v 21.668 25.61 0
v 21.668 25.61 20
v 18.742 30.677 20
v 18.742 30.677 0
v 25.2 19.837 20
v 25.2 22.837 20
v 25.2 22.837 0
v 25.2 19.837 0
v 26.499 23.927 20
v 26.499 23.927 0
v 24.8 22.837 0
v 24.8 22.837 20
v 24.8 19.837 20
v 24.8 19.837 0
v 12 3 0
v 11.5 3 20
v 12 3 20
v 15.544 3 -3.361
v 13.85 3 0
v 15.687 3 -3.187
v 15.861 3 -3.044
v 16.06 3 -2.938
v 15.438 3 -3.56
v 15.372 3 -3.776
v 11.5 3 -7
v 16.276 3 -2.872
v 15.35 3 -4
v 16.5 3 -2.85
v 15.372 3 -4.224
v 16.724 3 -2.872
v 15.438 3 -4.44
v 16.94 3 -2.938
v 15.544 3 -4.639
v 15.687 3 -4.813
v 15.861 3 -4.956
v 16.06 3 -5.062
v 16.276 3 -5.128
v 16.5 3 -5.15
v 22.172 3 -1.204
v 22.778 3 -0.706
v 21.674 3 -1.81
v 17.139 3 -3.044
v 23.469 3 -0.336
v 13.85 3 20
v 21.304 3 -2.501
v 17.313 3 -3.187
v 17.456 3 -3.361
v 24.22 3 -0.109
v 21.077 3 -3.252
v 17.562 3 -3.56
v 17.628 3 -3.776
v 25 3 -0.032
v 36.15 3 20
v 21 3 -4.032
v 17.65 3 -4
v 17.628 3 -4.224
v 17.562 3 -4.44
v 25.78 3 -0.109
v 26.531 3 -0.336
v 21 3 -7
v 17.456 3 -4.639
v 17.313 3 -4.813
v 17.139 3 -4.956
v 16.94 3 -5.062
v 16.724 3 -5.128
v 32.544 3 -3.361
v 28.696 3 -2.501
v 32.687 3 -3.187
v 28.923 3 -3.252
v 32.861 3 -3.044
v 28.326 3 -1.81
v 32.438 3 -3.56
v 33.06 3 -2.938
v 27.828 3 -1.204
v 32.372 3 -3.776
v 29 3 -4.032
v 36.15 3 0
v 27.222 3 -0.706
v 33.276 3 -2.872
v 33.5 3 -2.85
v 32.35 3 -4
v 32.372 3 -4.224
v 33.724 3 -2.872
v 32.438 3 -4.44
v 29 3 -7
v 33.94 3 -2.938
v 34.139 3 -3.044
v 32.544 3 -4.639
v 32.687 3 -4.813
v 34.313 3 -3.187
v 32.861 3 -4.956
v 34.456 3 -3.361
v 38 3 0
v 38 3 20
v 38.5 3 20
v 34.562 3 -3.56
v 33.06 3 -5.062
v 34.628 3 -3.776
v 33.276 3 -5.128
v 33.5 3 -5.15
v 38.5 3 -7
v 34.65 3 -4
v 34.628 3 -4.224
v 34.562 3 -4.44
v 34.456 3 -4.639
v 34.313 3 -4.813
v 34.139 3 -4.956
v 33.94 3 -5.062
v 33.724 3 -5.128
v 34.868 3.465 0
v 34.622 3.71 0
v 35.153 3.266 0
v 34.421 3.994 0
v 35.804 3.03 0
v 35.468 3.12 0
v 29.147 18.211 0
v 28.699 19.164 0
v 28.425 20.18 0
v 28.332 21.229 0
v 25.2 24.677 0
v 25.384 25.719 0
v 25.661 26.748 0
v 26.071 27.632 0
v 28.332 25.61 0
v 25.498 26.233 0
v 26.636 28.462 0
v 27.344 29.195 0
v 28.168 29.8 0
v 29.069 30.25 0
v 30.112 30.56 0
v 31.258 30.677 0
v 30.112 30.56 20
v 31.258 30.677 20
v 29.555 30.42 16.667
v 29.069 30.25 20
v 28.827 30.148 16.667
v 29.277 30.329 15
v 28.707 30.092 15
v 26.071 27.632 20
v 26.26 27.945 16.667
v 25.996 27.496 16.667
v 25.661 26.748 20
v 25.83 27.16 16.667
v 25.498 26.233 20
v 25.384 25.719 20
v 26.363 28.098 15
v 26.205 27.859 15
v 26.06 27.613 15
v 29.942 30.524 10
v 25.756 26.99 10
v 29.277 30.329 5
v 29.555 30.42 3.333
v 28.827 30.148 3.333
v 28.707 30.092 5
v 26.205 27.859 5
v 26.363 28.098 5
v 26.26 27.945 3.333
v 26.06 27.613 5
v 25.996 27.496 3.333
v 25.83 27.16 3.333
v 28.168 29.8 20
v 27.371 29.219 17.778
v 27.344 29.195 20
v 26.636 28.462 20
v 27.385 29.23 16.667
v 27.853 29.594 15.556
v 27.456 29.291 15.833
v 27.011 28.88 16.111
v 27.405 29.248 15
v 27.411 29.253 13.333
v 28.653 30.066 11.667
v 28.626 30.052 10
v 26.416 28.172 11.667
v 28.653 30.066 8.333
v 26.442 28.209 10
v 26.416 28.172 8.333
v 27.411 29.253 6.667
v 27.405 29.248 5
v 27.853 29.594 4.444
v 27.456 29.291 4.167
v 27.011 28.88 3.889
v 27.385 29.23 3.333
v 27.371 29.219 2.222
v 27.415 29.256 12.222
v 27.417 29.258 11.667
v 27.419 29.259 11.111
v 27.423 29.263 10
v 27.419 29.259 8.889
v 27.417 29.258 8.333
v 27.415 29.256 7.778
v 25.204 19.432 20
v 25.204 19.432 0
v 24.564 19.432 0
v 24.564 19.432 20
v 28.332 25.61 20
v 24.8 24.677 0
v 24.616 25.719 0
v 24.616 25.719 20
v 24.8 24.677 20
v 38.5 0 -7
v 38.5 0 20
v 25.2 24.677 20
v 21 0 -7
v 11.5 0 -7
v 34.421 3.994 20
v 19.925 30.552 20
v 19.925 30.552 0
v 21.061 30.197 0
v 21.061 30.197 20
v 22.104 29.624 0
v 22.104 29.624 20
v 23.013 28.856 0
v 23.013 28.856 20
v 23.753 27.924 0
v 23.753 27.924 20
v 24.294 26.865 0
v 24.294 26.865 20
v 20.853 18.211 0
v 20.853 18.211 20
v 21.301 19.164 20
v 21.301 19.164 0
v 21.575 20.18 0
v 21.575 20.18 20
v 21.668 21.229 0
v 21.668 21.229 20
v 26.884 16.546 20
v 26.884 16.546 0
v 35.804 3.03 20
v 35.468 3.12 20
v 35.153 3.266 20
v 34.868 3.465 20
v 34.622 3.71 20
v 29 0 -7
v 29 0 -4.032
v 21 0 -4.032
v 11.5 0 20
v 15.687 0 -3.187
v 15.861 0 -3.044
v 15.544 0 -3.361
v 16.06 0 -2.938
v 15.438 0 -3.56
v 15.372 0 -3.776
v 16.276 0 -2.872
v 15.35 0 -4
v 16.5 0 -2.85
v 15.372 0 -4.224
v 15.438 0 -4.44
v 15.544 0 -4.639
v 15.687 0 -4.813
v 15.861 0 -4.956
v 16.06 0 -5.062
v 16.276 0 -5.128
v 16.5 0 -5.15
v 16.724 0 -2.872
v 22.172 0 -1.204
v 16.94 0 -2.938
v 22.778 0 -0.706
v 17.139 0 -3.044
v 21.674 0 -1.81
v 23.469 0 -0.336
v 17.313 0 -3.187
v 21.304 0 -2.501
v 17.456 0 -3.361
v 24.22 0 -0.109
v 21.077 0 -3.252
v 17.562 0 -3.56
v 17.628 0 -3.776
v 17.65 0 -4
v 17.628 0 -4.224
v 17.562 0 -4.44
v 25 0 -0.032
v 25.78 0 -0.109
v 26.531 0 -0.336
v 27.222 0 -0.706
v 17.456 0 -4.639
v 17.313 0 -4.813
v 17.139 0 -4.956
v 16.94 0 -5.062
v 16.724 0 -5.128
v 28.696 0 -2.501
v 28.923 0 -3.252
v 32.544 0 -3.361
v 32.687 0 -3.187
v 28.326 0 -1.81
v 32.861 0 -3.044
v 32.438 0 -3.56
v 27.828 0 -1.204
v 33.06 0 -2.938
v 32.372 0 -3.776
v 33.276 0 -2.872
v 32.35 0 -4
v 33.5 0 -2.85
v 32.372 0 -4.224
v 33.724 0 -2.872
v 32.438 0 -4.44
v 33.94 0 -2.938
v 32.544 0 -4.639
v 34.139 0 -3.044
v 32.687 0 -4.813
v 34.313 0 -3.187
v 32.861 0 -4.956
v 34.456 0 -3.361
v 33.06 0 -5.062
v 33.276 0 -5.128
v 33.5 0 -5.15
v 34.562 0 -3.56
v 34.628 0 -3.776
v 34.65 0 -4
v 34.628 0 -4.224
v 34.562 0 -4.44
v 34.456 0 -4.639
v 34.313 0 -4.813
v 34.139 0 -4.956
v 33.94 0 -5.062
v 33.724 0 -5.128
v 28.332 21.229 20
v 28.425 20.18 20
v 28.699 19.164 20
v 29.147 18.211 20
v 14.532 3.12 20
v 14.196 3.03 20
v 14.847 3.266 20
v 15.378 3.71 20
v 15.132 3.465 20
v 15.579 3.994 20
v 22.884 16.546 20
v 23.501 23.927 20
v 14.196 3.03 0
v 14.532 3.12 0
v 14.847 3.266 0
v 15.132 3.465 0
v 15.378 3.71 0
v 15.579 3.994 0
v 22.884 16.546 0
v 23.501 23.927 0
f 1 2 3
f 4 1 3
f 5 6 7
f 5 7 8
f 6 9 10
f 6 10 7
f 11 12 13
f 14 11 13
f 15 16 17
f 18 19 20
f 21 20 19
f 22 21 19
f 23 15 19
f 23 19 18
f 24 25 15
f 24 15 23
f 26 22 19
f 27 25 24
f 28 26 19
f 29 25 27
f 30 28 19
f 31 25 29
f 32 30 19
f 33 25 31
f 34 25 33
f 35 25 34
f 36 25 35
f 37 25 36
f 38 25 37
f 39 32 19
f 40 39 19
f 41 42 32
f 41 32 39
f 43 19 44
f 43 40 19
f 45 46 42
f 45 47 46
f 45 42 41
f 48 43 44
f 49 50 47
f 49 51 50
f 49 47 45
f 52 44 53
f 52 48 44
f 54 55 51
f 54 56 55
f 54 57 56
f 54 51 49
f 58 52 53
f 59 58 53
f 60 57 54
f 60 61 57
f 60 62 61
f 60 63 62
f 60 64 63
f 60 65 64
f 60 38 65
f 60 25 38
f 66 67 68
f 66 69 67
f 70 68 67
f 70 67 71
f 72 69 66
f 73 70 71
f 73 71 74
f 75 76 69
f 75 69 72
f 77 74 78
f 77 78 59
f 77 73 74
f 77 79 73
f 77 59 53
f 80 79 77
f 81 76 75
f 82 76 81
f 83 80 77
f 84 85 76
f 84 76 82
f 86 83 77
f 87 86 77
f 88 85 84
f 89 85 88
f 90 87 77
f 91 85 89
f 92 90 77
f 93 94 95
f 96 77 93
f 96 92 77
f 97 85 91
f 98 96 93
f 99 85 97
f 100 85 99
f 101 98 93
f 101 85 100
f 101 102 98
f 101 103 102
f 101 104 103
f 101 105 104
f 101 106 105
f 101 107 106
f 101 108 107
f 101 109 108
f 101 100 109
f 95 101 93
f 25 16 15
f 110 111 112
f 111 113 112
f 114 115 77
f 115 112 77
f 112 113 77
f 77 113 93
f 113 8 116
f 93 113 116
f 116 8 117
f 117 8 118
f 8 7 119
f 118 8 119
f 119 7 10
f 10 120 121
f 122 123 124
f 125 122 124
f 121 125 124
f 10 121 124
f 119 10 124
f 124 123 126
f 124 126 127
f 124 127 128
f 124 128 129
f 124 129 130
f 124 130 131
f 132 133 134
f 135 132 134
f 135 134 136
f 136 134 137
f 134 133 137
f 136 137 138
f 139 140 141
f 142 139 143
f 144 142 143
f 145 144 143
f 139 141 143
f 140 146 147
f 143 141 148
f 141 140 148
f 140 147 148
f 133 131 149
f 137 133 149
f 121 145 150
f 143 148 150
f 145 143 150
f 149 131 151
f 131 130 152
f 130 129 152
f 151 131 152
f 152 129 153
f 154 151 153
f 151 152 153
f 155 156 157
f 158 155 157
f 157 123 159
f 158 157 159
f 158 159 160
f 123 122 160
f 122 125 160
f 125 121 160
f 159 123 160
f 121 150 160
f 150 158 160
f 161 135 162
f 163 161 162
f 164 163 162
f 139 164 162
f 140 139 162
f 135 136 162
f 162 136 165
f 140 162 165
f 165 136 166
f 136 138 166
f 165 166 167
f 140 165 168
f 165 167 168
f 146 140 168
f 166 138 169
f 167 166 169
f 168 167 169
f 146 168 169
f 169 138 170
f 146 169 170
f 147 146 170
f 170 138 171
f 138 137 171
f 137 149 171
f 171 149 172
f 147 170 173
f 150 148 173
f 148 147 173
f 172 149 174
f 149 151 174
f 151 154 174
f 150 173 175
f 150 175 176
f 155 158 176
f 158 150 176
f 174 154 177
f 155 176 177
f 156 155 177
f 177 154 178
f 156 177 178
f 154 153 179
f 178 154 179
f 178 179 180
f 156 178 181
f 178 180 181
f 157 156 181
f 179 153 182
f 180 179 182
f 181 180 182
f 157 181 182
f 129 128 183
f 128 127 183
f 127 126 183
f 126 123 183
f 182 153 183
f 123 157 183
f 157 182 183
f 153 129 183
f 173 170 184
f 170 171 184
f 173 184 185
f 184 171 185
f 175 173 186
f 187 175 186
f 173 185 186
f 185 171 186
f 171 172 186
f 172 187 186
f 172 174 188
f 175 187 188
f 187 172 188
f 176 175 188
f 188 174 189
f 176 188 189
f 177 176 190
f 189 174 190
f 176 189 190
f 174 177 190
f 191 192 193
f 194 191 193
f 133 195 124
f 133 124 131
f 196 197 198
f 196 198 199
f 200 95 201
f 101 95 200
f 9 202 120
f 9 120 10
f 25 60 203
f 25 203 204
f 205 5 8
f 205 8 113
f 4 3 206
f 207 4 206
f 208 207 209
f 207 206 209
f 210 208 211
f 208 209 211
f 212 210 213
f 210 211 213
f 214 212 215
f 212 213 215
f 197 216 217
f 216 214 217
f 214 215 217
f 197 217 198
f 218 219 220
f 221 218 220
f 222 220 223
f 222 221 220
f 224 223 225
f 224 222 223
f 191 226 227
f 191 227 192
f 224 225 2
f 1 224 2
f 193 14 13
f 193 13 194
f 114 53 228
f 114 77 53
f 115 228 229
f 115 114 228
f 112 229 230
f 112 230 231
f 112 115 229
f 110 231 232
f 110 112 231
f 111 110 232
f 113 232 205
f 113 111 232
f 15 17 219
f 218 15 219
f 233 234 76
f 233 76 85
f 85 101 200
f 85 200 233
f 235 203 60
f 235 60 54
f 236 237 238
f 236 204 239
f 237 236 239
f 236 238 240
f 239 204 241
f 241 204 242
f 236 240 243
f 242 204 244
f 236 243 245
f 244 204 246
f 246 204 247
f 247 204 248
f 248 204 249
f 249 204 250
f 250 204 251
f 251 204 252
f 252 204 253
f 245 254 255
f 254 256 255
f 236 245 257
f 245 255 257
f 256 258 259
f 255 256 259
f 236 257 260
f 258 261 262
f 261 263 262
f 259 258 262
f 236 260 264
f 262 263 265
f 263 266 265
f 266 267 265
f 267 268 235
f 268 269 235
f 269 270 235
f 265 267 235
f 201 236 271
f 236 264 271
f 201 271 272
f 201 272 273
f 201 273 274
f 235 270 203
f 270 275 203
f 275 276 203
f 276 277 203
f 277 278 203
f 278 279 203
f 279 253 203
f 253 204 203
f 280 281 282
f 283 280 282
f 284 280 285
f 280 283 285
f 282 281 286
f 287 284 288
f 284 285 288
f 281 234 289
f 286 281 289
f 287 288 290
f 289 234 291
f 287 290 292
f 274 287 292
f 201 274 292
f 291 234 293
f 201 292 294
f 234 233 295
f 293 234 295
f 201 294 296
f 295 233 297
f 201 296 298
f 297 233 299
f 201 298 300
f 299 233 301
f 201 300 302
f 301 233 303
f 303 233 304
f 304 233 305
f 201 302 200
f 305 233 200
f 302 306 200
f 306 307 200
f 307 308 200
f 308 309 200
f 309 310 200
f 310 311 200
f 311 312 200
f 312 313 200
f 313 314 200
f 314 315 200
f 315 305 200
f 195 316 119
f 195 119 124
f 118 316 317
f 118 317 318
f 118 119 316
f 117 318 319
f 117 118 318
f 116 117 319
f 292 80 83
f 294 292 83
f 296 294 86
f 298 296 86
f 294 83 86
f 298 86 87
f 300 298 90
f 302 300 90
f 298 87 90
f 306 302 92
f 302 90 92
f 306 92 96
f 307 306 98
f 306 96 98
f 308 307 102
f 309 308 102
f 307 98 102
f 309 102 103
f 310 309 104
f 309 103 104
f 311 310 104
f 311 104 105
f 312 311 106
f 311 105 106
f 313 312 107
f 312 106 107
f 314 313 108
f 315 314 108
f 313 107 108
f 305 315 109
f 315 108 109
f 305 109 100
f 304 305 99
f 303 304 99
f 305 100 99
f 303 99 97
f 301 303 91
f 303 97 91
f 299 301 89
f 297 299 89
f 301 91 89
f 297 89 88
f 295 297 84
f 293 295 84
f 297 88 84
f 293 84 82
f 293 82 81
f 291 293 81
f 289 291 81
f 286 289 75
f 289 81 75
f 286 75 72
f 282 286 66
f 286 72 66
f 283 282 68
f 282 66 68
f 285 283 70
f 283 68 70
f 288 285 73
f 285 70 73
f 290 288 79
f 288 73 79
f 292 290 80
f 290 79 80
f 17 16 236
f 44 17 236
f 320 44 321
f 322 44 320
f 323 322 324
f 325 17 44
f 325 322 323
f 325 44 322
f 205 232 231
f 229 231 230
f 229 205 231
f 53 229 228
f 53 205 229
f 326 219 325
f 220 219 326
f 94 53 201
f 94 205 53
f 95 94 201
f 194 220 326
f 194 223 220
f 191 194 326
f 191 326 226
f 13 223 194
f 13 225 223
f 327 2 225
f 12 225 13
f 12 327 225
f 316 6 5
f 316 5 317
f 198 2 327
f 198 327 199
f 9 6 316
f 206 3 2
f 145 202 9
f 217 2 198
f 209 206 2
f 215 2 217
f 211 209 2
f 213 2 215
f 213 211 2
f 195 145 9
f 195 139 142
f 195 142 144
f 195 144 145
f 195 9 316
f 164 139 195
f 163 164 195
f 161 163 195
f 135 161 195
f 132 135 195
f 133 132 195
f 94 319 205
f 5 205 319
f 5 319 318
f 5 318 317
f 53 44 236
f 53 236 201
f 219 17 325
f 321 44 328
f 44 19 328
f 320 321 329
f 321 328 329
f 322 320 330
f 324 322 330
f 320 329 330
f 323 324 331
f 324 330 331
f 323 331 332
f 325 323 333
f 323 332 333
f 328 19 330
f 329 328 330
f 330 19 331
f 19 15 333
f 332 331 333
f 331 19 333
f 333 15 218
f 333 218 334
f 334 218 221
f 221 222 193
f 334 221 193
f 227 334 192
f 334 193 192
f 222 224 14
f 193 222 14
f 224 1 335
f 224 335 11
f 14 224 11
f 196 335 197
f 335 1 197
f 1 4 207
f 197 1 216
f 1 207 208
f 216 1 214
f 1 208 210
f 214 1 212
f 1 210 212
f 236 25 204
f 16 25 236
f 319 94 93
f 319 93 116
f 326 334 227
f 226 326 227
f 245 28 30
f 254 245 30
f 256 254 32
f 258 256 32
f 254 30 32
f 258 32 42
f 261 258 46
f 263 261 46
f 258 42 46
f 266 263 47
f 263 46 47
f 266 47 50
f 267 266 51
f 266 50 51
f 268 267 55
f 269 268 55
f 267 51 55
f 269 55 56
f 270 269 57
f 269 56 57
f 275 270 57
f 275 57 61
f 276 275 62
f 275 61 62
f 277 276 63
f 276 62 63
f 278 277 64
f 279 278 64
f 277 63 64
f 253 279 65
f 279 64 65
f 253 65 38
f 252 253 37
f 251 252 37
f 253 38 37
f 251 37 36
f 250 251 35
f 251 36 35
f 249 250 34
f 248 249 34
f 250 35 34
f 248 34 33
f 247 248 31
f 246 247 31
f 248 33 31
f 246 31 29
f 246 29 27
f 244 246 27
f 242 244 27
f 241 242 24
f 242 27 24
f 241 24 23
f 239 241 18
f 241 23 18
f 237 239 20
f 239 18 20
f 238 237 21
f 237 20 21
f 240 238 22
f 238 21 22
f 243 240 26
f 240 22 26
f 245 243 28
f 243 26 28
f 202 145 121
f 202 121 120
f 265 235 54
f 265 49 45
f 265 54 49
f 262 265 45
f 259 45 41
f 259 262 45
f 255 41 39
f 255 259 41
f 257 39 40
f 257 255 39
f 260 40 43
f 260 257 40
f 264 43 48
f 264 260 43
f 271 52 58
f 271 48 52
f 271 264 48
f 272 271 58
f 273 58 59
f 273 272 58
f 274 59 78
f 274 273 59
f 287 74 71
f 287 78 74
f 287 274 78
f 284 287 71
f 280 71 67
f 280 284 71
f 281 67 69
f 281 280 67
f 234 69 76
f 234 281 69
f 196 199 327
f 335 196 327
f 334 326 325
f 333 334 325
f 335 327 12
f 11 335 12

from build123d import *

# Parameters (mm, degrees)
SCHIZZO1_W                     = 50
SCHIZZO1_H                     = 3
ESTRUSIONE_ESTRUSIONE1_DEPTH   = 20
ESTRUSIONE_ESTRUSIONE2_DEPTH   = 20
ESTRUSIONE_ESTRUSIONE2_2_DEPTH = 20
RACCORDO2_R                    = 6
RACCORDO3_DEPTH                = 20
RACCORDO4_R                    = 6
RACCORDO5_R                    = 6
RACCORDO7_R                    = 2
RACCORDO8_R                    = 2
SCHIZZO5_W                     = 11.5
SCHIZZO5_H                     = 20
TAGLIO_ESTRUSIONE2_DEPTH       = 3
ESTRUSIONE_ESTRUSIONE7_DEPTH   = 20
SCHIZZO12_R                    = 1.15
ESTRUSIONE_ESTRUSIONE9_DEPTH   = 3
TAGLIO_ESTRUSIONE4_DEPTH       = 52.461506674
TAGLIO_ESTRUSIONE4_DEPTH_BACK  = 52.461506674


with BuildPart() as part:
    # Schizzo1 → Estrusione-Estrusione1 (new body)
    with BuildSketch(Plane.XY):
        with Locations((25, 1.5)):
            Rectangle(SCHIZZO1_W, SCHIZZO1_H)
    extrude(amount=ESTRUSIONE_ESTRUSIONE1_DEPTH)

    # Schizzo5 → Taglio-Estrusione2 (cut)
    with BuildSketch(Plane(origin=(0, 3, 0), x_dir=(1, 0, 0), z_dir=(0, 1, 0))):
        with Locations((5.75, -10)):
            Rectangle(SCHIZZO5_W, SCHIZZO5_H)
        with Locations((44.25, -10)):
            Rectangle(SCHIZZO5_W, SCHIZZO5_H)
    extrude(amount=-TAGLIO_ESTRUSIONE2_DEPTH, mode=Mode.SUBTRACT)



with BuildPart() as body_2:
    # Schizzo2 → Estrusione-Estrusione2 (new body)
    with BuildSketch(Plane.XY.offset(20)):
        Polygon((12, 3), (21.667680152, 19.610006491), (21.667680152, 25.610006491), (18.742038116, 30.677367142), (23.742038116, 30.677367142), (24.8, 24.677367142), (23.500961894, 23.927367142), (24.8, 22.837344747), (24.8, 19.837344747), (15, 3), align=None)
    extrude(amount=-ESTRUSIONE_ESTRUSIONE2_DEPTH)

    # Raccordo2
    # the kernel refuses this fillet: 6 mm, written as the material it takes off along each edge
    with BuildSketch(Plane(origin=(23.742038116, 30.677367142, 32.586494468), x_dir=(-1, 0, 0), z_dir=(0, 0, -1))) as raccordo2_piece_1:
        with BuildLine():
            CenterArc((RACCORDO2_R * 0.839099631177, -RACCORDO2_R), RACCORDO2_R, 90, 80)
            Line((-RACCORDO2_R * 0.145708121835, -RACCORDO2_R * 0.826351822333), (0, 0))
            Line((0, 0), (RACCORDO2_R * 0.839099631177, 0))
        make_face()
    extrude(amount=45.172988935, mode=Mode.SUBTRACT)

    # Raccordo5
    raccordo5_edges = [body_2.edges().sort_by_distance(p)[0] for p in [
        (21.667680152, 19.610006491, 10),
    ]]
    fillet(raccordo5_edges, radius=RACCORDO5_R)

    # Raccordo8
    raccordo8_edges = [body_2.edges().sort_by_distance(p)[0] for p in [
        (15, 3, 10),
    ]]
    fillet(raccordo8_edges, radius=RACCORDO8_R)

    # Schizzo9 → Estrusione-Estrusione7 (add)
    with BuildSketch(Plane.XY.offset(20)):
        Polygon((24.564100135, 19.432046037), (22.884294771, 16.545978484), (26.884294771, 16.545978484), (25.204489408, 19.432046037), align=None)
    extrude(amount=-ESTRUSIONE_ESTRUSIONE7_DEPTH)


with BuildPart() as body_3:
    # Schizzo2 → Estrusione-Estrusione2 2 (new body)
    with BuildSketch(Plane.XY.offset(20)):
        Polygon((26.499038106, 23.927367142), (25.2, 22.837344747), (25.2, 19.837344747), (35, 3), (38, 3), (28.332319848, 19.610006491), (28.332319848, 25.610006491), (31.257961884, 30.677367142), (26.257961884, 30.677367142), (25.2, 24.677367142), align=None)
    extrude(amount=-ESTRUSIONE_ESTRUSIONE2_2_DEPTH)

    # Raccordo3: read off the stored shape, not the designer's step
    # Raccordo3 outline → Raccordo3 (cut)
    with BuildSketch(Plane.XY):
        with BuildLine():
            add(Edge.make_bspline(
                [(31.257961884, 30.677367142), (26.252870263, 30.648491125), (25.38373076, 25.719356061)],
                knots=[0, 0, 0, 1, 1, 1], degree=2, weights=[1, 0.767895459, 1]))
            Line((31.257961884, 30.677367142), (26.257961884, 30.677367142))
            Line((26.257961884, 30.677367142), (25.38373076, 25.719356061))
        make_face()
    extrude(amount=RACCORDO3_DEPTH, mode=Mode.SUBTRACT)

    # Raccordo4
    raccordo4_edges = [body_3.edges().sort_by_distance(p)[0] for p in [
        (28.332319848, 19.610006491, 10),
    ]]
    fillet(raccordo4_edges, radius=RACCORDO4_R)

    # Raccordo7
    raccordo7_edges = [body_3.edges().sort_by_distance(p)[0] for p in [
        (35, 3, 10),
    ]]
    fillet(raccordo7_edges, radius=RACCORDO7_R)


with BuildPart() as part_1:
    add(part.part)

    add(body_2.part)  # Estrusione-Estrusione9 merges body 2

    add(body_3.part)  # Estrusione-Estrusione9 merges body 3
    # Schizzo12 → Estrusione-Estrusione9 (add)
    with BuildSketch(Plane(origin=(0, 3, 0), x_dir=(1, 0, 0), z_dir=(0, 1, 0))):
        Polygon((11.5, 0), (38.5, 0), (38.5, 7), (29, 7), (21, 7), (11.5, 7), align=None)
        with Locations(Location((16.5, 4, 0), (0, 0, 270))):
            Circle(SCHIZZO12_R, mode=Mode.SUBTRACT)
        with Locations(Location((33.5, 4, 0), (0, 0, 270))):
            Circle(SCHIZZO12_R, mode=Mode.SUBTRACT)
    extrude(amount=-ESTRUSIONE_ESTRUSIONE9_DEPTH)

    # Schizzo13 → Taglio-Estrusione4 (cut, two sides: drawn at the far end of the back side and taken through both)
    with BuildSketch(Plane(origin=(0, 3, 0), x_dir=(1, 0, 0), z_dir=(0, 1, 0)).offset(-TAGLIO_ESTRUSIONE4_DEPTH_BACK)):
        with BuildLine():
            Line((21, 7), (21, 4.031977604))
            ThreePointArc((21, 4.031977604), (25, 0.031977604), (29, 4.031977604))
            Line((29, 4.031977604), (29, 7))
            Line((29, 7), (21, 7))
        make_face()
    extrude(amount=TAGLIO_ESTRUSIONE4_DEPTH + TAGLIO_ESTRUSIONE4_DEPTH_BACK, mode=Mode.SUBTRACT)


solid = part_1.part
